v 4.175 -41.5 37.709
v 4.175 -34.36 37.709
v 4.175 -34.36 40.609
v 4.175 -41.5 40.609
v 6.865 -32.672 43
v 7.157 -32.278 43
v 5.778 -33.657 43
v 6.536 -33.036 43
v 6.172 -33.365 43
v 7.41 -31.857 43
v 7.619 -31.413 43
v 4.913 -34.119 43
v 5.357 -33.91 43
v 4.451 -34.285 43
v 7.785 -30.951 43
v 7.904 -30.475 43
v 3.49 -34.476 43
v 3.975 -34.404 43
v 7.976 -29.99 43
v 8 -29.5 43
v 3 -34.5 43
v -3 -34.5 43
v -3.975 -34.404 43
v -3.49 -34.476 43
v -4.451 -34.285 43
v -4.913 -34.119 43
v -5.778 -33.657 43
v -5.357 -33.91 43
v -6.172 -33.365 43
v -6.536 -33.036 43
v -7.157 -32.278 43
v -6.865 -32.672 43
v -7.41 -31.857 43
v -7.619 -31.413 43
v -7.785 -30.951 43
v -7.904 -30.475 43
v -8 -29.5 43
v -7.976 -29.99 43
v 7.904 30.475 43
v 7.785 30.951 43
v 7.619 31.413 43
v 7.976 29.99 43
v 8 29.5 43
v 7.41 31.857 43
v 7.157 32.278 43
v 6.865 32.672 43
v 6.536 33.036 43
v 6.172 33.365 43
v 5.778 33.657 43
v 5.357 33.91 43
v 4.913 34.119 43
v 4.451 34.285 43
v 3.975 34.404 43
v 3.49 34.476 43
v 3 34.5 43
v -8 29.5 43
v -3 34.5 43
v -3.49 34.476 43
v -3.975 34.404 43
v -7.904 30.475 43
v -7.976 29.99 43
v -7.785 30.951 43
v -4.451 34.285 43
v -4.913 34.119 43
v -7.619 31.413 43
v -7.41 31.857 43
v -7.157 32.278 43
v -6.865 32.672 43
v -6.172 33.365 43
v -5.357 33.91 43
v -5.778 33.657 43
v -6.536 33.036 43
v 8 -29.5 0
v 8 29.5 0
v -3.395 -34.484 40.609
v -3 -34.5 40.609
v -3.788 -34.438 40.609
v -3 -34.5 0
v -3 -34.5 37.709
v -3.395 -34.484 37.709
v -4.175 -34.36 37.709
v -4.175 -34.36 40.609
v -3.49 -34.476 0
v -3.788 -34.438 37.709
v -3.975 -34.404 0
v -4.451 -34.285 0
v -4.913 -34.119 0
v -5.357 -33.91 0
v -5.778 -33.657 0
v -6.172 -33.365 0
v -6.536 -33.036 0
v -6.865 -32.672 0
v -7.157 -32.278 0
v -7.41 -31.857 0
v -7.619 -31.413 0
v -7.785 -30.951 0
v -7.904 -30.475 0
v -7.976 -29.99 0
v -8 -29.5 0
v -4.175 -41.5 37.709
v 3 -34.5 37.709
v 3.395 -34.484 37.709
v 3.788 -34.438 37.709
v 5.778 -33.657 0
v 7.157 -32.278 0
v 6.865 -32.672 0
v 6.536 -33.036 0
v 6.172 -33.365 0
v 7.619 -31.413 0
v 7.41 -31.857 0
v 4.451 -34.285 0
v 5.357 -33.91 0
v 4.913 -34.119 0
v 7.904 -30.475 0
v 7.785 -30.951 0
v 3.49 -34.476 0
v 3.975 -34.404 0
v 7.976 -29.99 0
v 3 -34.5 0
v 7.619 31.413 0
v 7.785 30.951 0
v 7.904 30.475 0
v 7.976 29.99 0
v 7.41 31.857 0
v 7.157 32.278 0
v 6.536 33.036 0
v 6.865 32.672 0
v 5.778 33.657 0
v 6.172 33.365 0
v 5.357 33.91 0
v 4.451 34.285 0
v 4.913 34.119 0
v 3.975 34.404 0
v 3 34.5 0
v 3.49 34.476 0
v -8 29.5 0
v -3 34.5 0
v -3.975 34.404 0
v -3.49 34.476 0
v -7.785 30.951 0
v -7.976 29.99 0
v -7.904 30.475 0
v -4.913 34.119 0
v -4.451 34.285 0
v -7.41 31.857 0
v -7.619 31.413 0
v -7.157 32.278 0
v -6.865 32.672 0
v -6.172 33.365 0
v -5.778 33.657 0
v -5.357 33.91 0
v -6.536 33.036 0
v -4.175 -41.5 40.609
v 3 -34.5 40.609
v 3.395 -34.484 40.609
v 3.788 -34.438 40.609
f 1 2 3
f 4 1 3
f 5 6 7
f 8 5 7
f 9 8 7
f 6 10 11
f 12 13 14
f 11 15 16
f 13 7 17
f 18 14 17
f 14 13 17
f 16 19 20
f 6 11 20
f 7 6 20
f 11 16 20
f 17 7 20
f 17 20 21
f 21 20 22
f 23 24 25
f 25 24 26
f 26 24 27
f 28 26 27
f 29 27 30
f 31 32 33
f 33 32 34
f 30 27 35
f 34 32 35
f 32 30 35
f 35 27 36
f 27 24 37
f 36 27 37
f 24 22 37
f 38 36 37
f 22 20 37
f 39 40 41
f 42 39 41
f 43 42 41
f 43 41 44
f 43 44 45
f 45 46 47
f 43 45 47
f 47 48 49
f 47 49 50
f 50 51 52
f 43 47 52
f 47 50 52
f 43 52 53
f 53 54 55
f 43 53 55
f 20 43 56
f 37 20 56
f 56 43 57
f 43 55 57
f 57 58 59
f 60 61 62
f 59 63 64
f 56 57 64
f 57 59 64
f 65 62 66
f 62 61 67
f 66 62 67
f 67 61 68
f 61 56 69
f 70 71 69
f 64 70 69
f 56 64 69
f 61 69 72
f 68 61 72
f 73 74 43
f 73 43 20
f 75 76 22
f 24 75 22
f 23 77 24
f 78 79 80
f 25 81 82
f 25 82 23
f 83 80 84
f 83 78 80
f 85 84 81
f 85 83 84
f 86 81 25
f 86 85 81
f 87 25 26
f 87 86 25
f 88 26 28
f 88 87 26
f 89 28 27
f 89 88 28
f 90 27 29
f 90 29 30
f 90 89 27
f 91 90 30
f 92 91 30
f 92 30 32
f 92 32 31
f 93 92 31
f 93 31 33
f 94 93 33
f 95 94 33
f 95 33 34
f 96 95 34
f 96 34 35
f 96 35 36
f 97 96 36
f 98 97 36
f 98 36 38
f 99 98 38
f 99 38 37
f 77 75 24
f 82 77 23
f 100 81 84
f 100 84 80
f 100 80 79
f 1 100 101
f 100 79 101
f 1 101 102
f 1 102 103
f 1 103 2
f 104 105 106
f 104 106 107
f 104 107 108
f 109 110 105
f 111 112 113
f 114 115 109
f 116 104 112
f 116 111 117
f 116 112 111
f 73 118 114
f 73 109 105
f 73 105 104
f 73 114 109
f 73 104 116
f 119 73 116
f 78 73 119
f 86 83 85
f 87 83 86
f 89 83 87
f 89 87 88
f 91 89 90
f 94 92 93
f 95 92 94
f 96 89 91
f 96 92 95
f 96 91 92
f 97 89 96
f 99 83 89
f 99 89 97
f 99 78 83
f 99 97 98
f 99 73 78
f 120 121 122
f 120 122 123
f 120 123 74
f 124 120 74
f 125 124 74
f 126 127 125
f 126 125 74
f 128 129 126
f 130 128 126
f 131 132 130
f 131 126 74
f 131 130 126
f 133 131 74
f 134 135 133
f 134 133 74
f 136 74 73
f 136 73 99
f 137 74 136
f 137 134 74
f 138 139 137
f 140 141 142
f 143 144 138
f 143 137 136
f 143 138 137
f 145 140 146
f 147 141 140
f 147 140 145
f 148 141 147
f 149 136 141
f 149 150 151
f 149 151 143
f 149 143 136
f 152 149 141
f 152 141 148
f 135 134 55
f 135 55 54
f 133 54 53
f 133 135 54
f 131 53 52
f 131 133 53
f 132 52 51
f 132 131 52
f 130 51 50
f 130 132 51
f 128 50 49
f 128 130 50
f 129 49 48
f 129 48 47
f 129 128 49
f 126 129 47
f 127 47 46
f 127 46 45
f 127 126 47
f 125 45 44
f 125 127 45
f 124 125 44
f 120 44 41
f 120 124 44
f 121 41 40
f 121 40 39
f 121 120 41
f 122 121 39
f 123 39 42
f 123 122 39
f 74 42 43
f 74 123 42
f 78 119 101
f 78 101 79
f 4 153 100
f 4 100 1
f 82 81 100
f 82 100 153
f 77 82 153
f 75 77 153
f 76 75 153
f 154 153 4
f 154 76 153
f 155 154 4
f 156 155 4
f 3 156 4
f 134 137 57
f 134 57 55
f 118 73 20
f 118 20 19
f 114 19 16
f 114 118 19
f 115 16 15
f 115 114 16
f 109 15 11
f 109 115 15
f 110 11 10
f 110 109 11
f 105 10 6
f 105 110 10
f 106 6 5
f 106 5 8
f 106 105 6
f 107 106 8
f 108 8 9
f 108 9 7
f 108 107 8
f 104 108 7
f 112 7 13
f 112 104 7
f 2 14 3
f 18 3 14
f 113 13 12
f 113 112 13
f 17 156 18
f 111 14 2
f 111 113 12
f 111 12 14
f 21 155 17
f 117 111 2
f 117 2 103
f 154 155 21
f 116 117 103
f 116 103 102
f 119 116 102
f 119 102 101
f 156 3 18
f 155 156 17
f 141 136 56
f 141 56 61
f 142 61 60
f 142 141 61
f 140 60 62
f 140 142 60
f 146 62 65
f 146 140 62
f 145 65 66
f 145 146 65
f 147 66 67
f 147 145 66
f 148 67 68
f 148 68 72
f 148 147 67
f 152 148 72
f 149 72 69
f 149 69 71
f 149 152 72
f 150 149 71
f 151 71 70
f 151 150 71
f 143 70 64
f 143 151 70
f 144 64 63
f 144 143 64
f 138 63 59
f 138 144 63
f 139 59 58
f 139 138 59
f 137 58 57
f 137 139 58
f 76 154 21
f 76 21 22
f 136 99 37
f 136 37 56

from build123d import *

# Parameters (mm, degrees)
RESSALTO_EXTRUS_O4_DEPTH      = 43
RESSALTO_EXTRUS_O5_DEPTH      = 7
RESSALTO_EXTRUS_O5_DEPTH_BACK = 10
ESBO_O5_W                     = 8.350993052
ESBO_O5_H                     = 2.899650365


with BuildPart() as part:
    # Esboço4 → Ressalto-extrusão4 (new body)
    with BuildSketch(Plane.XY):
        with BuildLine():
            Line((-3, 34.5), (3, 34.5))
            ThreePointArc((3, 34.5), (6.535533906, 33.035533906), (8, 29.5))
            Line((8, 29.5), (8, -29.5))
            ThreePointArc((8, -29.5), (6.535533906, -33.035533906), (3, -34.5))
            Line((3, -34.5), (-3, -34.5))
            ThreePointArc((-3, -34.5), (-6.535533906, -33.035533906), (-8, -29.5))
            Line((-8, -29.5), (-8, 29.5))
            ThreePointArc((-8, 29.5), (-6.535533906, 33.035533906), (-3, 34.5))
        make_face()
    extrude(amount=RESSALTO_EXTRUS_O4_DEPTH)

    # Esboço5 → Ressalto-extrusão5 (add, two sides: drawn at the far end of the back side and taken through both)
    with BuildSketch(Plane.XZ.offset(34.5).offset(-RESSALTO_EXTRUS_O5_DEPTH_BACK)):
        with Locations((0, 39.158870724)):
            Rectangle(ESBO_O5_W, ESBO_O5_H)
    extrude(amount=RESSALTO_EXTRUS_O5_DEPTH + RESSALTO_EXTRUS_O5_DEPTH_BACK)


solid = part.part
